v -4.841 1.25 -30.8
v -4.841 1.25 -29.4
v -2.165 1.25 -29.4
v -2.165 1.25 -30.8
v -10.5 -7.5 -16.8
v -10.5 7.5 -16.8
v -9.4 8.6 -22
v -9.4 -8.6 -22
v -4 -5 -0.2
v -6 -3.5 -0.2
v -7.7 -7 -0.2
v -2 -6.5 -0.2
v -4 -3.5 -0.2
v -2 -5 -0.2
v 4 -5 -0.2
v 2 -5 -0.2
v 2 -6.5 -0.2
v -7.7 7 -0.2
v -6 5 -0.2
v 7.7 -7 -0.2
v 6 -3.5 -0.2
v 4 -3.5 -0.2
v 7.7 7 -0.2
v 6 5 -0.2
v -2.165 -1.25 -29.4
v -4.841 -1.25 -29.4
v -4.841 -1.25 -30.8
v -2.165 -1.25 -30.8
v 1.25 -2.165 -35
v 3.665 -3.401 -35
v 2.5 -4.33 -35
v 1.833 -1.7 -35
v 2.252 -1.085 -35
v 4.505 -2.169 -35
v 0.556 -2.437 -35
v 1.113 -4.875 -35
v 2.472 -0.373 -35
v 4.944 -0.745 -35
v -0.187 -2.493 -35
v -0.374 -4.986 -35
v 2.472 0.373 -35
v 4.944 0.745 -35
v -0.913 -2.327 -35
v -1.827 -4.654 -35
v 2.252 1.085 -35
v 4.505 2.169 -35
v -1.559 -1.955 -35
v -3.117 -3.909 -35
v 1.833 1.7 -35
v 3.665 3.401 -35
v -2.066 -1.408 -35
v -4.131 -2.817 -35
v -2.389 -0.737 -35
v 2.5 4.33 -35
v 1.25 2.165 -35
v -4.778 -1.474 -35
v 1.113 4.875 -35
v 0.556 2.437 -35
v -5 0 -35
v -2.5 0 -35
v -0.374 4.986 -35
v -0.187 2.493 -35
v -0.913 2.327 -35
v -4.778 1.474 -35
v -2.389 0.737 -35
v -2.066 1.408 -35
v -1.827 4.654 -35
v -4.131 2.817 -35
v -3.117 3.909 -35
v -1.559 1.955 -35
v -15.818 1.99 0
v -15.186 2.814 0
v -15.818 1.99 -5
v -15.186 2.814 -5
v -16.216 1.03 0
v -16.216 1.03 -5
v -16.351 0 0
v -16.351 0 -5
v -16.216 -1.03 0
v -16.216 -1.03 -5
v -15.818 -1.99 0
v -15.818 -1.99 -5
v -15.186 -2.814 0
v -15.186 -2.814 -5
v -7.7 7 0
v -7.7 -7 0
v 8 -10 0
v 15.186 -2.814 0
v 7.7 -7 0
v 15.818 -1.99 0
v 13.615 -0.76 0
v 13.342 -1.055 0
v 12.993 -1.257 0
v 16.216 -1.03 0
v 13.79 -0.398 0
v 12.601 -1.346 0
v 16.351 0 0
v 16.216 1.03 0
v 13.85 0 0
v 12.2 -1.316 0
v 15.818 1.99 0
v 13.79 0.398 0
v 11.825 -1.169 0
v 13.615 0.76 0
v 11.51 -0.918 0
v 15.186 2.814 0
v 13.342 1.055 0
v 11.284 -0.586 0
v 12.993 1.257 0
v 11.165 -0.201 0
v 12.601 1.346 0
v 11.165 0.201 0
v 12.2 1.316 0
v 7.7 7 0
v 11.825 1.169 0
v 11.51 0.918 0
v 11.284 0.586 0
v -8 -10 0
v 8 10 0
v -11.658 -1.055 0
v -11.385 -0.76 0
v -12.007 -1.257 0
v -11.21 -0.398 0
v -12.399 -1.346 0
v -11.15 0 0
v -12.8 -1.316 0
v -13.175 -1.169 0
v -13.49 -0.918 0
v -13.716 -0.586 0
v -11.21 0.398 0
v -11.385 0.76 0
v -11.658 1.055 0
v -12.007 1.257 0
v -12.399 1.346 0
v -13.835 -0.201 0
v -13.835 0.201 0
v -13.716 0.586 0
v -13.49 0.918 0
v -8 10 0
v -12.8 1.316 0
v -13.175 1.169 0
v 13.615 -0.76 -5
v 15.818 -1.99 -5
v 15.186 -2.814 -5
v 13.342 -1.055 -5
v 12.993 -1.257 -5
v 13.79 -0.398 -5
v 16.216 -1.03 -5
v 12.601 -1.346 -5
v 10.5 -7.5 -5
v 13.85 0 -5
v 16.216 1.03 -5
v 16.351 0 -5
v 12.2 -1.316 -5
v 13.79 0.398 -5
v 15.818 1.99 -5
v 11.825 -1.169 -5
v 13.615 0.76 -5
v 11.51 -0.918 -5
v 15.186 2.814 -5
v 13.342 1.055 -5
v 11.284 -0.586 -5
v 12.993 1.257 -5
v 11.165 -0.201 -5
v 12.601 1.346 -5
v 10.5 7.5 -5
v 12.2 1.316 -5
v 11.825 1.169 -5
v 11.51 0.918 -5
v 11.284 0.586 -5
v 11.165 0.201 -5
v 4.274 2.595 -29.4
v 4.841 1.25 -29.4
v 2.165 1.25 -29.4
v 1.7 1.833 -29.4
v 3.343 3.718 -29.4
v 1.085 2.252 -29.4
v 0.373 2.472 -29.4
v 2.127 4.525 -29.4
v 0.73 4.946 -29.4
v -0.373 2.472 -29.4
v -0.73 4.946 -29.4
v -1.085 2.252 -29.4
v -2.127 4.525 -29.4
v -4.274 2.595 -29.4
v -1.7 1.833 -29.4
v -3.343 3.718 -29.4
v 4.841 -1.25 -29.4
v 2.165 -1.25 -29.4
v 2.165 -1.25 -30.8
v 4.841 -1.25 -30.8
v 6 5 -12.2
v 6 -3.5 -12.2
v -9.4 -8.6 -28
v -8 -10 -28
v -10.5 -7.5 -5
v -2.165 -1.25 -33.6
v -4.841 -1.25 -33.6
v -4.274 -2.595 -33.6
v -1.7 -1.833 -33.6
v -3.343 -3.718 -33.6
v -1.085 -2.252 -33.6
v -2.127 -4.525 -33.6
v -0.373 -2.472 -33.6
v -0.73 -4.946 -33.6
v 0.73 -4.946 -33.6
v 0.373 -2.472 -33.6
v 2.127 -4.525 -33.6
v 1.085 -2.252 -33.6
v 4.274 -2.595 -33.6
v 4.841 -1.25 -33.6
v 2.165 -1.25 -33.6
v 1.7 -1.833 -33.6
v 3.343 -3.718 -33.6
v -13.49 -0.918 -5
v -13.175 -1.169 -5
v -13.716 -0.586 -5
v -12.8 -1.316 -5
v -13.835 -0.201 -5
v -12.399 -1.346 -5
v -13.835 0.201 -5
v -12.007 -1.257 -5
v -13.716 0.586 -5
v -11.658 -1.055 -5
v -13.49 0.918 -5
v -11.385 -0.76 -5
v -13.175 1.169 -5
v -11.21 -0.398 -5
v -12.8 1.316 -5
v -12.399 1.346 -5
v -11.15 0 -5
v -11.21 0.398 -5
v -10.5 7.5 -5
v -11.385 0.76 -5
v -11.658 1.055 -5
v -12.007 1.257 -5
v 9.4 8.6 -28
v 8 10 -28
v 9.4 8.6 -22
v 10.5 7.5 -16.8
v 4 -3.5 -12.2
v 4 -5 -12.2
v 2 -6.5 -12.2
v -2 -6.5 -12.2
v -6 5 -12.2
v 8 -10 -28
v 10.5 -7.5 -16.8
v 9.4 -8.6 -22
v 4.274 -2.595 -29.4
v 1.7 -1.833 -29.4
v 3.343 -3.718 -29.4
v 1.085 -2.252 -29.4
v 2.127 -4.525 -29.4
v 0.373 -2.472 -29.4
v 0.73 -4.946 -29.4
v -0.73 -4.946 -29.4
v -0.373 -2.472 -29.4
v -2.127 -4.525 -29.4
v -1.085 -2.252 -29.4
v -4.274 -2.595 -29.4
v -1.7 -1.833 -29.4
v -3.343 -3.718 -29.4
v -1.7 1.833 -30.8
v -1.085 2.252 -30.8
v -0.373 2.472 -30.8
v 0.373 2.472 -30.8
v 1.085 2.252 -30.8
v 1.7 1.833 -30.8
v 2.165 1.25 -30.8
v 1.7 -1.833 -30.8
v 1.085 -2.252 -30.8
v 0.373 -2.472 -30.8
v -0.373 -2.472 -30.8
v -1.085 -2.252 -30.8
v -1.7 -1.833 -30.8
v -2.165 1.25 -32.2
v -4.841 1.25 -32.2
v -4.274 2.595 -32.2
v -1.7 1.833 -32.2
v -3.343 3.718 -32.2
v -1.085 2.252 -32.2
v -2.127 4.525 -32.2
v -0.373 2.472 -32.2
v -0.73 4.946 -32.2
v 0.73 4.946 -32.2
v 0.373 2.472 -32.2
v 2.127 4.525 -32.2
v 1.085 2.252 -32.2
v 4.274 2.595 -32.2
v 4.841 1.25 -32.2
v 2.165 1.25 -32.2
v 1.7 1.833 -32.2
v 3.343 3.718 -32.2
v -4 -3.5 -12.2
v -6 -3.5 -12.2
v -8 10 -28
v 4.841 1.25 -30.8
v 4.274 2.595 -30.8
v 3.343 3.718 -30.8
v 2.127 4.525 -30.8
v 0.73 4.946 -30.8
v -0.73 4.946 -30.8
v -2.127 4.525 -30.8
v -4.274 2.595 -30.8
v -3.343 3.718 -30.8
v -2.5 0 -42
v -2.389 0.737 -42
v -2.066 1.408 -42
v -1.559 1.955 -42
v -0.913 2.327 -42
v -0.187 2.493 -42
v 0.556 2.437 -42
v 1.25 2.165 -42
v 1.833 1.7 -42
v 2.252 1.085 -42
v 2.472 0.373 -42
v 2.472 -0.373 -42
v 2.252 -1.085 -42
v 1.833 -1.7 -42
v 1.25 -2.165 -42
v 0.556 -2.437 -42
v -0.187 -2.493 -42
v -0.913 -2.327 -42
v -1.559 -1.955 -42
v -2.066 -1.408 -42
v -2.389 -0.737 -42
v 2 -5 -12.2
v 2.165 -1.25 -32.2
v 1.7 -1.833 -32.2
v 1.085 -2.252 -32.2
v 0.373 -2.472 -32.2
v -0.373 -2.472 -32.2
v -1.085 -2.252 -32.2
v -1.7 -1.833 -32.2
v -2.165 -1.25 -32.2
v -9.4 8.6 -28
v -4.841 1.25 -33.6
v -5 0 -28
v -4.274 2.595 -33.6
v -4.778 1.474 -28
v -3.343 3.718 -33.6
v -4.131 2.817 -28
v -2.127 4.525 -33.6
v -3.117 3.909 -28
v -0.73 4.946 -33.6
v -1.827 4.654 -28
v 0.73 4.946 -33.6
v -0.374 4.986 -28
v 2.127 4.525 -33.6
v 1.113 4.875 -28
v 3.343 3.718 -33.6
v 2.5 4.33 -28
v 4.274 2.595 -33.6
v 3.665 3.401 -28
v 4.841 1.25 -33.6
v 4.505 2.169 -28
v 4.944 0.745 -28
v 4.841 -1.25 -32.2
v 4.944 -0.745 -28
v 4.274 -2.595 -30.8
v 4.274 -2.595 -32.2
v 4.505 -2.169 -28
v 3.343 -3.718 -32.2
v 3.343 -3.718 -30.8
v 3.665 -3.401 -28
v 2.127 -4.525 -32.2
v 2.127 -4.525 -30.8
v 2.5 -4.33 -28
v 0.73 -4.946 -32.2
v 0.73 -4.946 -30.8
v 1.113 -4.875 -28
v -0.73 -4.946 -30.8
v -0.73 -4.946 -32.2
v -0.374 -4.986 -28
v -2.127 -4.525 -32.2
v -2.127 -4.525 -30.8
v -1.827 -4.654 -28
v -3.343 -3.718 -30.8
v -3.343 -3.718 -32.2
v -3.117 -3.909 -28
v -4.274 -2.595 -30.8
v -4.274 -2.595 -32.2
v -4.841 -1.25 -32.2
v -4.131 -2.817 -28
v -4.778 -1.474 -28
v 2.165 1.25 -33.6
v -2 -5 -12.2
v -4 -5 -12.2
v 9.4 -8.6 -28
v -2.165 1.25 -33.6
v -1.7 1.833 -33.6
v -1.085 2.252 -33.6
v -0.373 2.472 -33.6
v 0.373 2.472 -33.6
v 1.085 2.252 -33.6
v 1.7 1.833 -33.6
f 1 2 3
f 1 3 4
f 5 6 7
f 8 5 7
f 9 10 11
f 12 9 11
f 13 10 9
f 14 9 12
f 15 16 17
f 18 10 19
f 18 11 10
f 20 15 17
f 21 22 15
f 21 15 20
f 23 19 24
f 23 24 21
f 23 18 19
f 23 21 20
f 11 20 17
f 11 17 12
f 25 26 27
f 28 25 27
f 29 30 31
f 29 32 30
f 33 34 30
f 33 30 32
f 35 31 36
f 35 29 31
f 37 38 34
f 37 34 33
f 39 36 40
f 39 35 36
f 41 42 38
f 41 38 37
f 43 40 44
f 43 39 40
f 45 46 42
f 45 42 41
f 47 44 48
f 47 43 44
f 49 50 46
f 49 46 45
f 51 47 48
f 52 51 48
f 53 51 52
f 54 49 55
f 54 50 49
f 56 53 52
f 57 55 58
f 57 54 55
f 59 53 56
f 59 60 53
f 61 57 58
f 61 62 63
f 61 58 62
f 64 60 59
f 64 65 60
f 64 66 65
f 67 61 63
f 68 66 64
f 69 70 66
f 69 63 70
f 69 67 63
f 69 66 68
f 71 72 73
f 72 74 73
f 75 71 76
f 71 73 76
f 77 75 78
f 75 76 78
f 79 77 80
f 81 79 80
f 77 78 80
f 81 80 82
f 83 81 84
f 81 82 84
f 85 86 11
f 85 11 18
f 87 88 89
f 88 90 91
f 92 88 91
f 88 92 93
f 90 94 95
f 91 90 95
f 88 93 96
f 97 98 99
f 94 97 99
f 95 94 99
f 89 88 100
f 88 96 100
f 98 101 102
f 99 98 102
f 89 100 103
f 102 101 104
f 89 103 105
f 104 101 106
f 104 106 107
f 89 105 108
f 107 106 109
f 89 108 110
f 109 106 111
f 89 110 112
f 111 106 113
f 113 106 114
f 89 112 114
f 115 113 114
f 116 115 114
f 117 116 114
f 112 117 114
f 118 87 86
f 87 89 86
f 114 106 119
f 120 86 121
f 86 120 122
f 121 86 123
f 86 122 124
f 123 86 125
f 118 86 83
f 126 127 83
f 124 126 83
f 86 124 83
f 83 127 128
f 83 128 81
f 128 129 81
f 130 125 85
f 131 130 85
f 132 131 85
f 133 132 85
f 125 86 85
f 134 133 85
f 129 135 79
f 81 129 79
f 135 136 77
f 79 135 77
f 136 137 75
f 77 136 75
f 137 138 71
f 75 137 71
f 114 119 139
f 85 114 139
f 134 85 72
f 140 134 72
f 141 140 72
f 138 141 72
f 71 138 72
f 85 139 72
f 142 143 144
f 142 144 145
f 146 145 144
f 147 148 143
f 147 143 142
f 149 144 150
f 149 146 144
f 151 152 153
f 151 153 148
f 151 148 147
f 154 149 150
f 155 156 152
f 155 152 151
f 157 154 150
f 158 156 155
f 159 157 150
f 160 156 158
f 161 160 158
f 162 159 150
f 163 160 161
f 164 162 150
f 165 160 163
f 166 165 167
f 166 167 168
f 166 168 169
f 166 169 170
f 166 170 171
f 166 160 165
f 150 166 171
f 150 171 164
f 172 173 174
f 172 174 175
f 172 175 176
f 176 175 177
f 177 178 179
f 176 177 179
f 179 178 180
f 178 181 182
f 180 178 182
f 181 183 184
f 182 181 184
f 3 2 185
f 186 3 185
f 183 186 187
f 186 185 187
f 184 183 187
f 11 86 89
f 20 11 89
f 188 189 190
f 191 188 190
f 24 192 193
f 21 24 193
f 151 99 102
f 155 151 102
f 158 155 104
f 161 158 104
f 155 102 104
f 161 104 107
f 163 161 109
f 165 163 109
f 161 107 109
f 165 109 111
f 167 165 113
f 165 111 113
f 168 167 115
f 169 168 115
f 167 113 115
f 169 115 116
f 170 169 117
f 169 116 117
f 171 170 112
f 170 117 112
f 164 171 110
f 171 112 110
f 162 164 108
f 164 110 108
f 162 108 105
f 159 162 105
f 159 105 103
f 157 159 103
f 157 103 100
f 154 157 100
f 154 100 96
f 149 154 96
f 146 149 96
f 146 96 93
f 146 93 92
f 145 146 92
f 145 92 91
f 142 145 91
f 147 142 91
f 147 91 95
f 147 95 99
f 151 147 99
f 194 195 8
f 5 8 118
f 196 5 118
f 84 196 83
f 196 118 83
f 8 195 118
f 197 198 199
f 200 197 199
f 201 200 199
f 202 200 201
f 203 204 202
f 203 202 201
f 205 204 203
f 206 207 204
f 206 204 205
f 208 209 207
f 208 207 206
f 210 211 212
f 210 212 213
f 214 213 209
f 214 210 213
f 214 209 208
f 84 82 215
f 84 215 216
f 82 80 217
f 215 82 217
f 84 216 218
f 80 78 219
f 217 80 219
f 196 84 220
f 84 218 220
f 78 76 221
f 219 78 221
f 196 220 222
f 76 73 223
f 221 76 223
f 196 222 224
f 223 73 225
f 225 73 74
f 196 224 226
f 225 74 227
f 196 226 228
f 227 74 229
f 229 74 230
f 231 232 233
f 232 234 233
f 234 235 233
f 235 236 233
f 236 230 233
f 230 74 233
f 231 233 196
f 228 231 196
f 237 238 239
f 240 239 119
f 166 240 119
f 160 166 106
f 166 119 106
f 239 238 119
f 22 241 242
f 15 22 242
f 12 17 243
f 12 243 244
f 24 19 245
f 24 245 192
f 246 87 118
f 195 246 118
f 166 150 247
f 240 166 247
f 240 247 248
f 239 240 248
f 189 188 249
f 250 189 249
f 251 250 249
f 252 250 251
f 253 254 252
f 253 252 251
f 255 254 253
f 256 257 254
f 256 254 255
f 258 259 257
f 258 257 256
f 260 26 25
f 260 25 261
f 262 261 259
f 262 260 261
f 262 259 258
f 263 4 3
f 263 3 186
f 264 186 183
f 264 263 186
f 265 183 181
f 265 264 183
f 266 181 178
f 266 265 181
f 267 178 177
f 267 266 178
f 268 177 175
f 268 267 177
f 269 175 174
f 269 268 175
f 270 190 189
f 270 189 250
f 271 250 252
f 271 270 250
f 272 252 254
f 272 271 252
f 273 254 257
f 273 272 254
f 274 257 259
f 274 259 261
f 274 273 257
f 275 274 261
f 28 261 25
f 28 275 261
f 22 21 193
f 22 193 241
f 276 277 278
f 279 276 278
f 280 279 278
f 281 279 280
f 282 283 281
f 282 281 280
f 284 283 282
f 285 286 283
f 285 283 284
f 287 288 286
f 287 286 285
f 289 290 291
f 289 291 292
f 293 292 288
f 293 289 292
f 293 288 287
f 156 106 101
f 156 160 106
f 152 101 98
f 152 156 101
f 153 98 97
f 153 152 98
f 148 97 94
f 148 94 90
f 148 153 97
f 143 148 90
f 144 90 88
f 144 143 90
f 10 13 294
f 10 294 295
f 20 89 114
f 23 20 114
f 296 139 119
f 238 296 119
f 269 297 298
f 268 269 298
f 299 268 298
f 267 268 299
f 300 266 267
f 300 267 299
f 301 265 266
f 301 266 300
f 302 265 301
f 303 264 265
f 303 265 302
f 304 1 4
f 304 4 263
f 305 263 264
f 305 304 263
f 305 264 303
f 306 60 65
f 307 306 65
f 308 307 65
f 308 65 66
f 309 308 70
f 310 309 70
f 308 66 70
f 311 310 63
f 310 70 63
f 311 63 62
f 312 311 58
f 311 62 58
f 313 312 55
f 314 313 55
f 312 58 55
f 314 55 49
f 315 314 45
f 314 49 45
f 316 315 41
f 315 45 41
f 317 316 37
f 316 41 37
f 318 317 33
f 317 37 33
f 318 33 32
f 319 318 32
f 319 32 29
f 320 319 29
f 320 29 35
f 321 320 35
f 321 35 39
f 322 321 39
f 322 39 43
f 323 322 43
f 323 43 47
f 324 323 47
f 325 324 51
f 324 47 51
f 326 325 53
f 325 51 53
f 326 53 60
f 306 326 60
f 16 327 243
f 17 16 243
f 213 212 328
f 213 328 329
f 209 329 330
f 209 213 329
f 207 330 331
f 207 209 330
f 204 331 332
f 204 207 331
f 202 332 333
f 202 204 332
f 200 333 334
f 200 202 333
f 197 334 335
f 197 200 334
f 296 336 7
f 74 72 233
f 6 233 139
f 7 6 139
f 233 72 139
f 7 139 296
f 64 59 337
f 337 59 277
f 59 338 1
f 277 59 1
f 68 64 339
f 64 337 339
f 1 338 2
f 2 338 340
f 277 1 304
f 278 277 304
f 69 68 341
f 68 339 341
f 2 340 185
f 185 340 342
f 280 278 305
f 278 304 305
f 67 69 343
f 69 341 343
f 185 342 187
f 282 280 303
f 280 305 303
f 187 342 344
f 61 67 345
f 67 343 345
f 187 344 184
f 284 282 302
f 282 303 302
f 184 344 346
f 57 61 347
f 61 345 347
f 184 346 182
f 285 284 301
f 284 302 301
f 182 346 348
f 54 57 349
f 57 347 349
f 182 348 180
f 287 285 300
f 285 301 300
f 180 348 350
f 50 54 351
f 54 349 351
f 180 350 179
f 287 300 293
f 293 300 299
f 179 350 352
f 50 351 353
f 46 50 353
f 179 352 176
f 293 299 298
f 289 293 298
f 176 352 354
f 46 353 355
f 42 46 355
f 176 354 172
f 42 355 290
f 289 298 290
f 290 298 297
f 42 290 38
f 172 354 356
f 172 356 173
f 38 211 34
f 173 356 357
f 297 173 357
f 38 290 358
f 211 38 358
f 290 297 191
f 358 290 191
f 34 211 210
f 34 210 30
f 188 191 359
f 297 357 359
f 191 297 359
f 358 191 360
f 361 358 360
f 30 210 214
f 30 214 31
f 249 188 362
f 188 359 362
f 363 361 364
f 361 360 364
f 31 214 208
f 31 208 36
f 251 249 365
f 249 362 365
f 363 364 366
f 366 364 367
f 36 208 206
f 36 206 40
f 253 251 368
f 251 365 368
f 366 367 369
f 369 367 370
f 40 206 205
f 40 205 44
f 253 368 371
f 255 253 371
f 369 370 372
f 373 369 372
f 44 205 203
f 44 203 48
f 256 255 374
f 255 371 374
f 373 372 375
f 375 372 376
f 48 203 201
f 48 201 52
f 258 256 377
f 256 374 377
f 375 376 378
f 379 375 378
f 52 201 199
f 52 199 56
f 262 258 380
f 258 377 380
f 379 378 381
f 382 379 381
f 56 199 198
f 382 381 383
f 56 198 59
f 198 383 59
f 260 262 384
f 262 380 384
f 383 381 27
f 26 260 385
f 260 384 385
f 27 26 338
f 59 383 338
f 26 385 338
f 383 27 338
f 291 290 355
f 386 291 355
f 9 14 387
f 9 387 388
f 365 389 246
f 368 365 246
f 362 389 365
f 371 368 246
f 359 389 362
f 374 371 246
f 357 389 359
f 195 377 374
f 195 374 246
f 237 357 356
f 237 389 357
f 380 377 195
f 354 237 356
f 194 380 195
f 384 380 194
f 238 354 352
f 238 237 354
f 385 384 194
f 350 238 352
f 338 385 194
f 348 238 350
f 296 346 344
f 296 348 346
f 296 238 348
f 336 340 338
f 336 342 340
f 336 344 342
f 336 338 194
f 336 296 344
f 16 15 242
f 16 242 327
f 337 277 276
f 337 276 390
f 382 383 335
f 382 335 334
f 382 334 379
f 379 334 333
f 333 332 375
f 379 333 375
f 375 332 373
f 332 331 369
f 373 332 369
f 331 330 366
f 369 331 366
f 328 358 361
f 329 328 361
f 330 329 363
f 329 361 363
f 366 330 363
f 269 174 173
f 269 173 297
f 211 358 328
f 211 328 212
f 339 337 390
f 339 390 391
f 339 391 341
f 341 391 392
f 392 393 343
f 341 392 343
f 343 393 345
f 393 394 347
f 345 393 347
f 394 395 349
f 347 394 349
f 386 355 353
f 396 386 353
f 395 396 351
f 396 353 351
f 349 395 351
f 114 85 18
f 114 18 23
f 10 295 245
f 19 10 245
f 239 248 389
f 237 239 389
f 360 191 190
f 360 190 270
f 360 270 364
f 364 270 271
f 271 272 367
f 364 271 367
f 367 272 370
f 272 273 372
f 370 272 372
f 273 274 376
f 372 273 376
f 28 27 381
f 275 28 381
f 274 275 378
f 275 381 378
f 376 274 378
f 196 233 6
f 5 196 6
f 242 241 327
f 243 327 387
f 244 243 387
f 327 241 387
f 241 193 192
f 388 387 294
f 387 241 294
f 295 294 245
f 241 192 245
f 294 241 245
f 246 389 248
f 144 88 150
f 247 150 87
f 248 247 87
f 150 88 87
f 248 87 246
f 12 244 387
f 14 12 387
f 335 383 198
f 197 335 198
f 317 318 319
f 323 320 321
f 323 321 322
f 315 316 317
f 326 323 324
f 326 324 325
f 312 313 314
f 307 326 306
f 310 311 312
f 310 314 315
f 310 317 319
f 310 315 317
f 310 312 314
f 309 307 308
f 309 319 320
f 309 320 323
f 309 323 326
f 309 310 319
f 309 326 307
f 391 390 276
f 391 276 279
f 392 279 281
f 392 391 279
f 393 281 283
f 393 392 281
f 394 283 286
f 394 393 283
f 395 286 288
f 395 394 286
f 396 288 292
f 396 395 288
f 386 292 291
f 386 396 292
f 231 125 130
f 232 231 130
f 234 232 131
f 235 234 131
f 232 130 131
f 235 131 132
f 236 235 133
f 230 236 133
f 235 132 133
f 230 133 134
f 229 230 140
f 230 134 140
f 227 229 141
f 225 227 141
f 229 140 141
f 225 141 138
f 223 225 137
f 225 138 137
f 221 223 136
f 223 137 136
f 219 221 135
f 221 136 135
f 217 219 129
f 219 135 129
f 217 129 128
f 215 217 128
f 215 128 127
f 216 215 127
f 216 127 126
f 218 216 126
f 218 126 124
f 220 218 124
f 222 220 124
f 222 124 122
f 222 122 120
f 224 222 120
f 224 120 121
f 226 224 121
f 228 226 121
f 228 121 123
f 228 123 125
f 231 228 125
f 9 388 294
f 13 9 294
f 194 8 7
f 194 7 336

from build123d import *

# Parameters (mm, degrees)
BOSS_EXTRUDE1_DEPTH      = 28
CUT_EXTRUDE1_DEPTH       = 11
CUT_EXTRUDE2_REACH       = 30
SKETCH3_R                = 1.35
FILLET1_R                = 3.98
SKETCH4_R                = 5
BOSS_EXTRUDE2_DEPTH      = 7
SKETCH6_W                = 1.4
SKETCH6_H                = 3.75
CUT_EXTRUDE3_DEPTH       = 17.351430022
SKETCH5_R                = 2.5
BOSS_EXTRUDE3_DEPTH      = 7
BOSS_EXTRUDE3_DEPTH_BACK = 7
SKETCH7_W                = 15.4
SKETCH7_H                = 14
CUT_EXTRUDE4_DEPTH       = 0.2
CUT_EXTRUDE5_DEPTH       = 12


with BuildPart() as part:
    # Sketch1 → Boss-Extrude1 (new body)
    with BuildSketch(Plane.XY):
        Polygon((8, 10), (18, 0), (8, -10), (-8, -10), (-18, 0), (-8, 10), align=None)
    extrude(amount=-BOSS_EXTRUDE1_DEPTH)

    # Sketch2 → Cut-Extrude1 (cut, symmetric)
    with BuildSketch(Plane(origin=(0, 0, 0), x_dir=(1, 0, 0), z_dir=(0, 1, 0))):
        Polygon((-18, 5), (-10.5, 5), (-10.5, 16.8), (-9.4, 22), (-9.4, 28), (-18, 28), align=None)
    cut_extrude1 = extrude(amount=CUT_EXTRUDE1_DEPTH, both=True, mode=Mode.SUBTRACT)

    # Mirror1: Cut-Extrude1 across plane
    add(cut_extrude1.mirror(Plane(origin=(0, 0, 0), x_dir=(0, 0, 1), z_dir=(1, 0, 0))), mode=Mode.SUBTRACT)

    # Sketch3 → Cut-Extrude2 (cut, up to next)
    with BuildSketch(Plane.XY, mode=Mode.PRIVATE) as cut_extrude2_sk1:
        with Locations((-12.5, 0)):
            Circle(SKETCH3_R)
    cut_extrude2_tool1 = extrude(cut_extrude2_sk1.sketch, amount=-CUT_EXTRUDE2_REACH, mode=Mode.PRIVATE) & part.part
    add(cut_extrude2_tool1.solids().sort_by_distance((-12.5, 0, 0))[0], mode=Mode.SUBTRACT)
    # Sketch3 → Cut-Extrude2 (cut, up to next)
    with BuildSketch(Plane.XY, mode=Mode.PRIVATE) as cut_extrude2_sk2:
        with Locations((12.5, 0)):
            Circle(SKETCH3_R)
    cut_extrude2_tool2 = extrude(cut_extrude2_sk2.sketch, amount=-CUT_EXTRUDE2_REACH, mode=Mode.PRIVATE) & part.part
    add(cut_extrude2_tool2.solids().sort_by_distance((12.5, 0, 0))[0], mode=Mode.SUBTRACT)

    # Fillet1
    fillet1_edges = [part.edges().sort_by_distance(p)[0] for p in [
        (-18, 0, -2.5),
        (18, 0, -2.5),
    ]]
    fillet(fillet1_edges, radius=FILLET1_R)

    # Sketch4 → Boss-Extrude2 (add)
    with BuildSketch(Plane(origin=(0, 0, -28), x_dir=(-1, 0, 0), z_dir=(0, 0, -1))):
        Circle(SKETCH4_R)
    extrude(amount=BOSS_EXTRUDE2_DEPTH)

    # Sketch6 → Cut-Extrude3 (cut, symmetric)
    with BuildSketch(Plane(origin=(0, 0, 0), x_dir=(0, 0, -1), z_dir=(1, 0, 0))):
        with Locations((30.1, 3.125)):
            Rectangle(SKETCH6_W, SKETCH6_H)
        with Locations((32.9, 3.125)):
            Rectangle(SKETCH6_W, SKETCH6_H)
    cut_extrude3 = extrude(amount=CUT_EXTRUDE3_DEPTH, both=True, mode=Mode.SUBTRACT)

    # Mirror2: Cut-Extrude3 across plane
    add(cut_extrude3.mirror(Plane.ZX), mode=Mode.SUBTRACT)

    # Sketch5 → Boss-Extrude3 (add, two sides)
    with BuildSketch(Plane(origin=(0, 0, -35), x_dir=(-1, 0, 0), z_dir=(0, 0, -1))) as boss_extrude3_sk:
        Circle(SKETCH5_R)
    extrude(amount=BOSS_EXTRUDE3_DEPTH)
    extrude(boss_extrude3_sk.sketch, amount=-BOSS_EXTRUDE3_DEPTH_BACK)

    # Sketch7 → Cut-Extrude4 (cut)
    with BuildSketch(Plane.XY):
        Rectangle(SKETCH7_W, SKETCH7_H)
    extrude(amount=-CUT_EXTRUDE4_DEPTH, mode=Mode.SUBTRACT)

    # Sketch8 → Cut-Extrude5 (cut)
    with BuildSketch(Plane.XY.offset(-0.2)):
        Polygon((-6, 5), (6, 5), (6, -3.5), (4, -3.5), (4, -5), (2, -5), (2, -6.5), (-2, -6.5), (-2, -5), (-4, -5), (-4, -3.5), (-6, -3.5), align=None)
    extrude(amount=-CUT_EXTRUDE5_DEPTH, mode=Mode.SUBTRACT)


solid = part.part
